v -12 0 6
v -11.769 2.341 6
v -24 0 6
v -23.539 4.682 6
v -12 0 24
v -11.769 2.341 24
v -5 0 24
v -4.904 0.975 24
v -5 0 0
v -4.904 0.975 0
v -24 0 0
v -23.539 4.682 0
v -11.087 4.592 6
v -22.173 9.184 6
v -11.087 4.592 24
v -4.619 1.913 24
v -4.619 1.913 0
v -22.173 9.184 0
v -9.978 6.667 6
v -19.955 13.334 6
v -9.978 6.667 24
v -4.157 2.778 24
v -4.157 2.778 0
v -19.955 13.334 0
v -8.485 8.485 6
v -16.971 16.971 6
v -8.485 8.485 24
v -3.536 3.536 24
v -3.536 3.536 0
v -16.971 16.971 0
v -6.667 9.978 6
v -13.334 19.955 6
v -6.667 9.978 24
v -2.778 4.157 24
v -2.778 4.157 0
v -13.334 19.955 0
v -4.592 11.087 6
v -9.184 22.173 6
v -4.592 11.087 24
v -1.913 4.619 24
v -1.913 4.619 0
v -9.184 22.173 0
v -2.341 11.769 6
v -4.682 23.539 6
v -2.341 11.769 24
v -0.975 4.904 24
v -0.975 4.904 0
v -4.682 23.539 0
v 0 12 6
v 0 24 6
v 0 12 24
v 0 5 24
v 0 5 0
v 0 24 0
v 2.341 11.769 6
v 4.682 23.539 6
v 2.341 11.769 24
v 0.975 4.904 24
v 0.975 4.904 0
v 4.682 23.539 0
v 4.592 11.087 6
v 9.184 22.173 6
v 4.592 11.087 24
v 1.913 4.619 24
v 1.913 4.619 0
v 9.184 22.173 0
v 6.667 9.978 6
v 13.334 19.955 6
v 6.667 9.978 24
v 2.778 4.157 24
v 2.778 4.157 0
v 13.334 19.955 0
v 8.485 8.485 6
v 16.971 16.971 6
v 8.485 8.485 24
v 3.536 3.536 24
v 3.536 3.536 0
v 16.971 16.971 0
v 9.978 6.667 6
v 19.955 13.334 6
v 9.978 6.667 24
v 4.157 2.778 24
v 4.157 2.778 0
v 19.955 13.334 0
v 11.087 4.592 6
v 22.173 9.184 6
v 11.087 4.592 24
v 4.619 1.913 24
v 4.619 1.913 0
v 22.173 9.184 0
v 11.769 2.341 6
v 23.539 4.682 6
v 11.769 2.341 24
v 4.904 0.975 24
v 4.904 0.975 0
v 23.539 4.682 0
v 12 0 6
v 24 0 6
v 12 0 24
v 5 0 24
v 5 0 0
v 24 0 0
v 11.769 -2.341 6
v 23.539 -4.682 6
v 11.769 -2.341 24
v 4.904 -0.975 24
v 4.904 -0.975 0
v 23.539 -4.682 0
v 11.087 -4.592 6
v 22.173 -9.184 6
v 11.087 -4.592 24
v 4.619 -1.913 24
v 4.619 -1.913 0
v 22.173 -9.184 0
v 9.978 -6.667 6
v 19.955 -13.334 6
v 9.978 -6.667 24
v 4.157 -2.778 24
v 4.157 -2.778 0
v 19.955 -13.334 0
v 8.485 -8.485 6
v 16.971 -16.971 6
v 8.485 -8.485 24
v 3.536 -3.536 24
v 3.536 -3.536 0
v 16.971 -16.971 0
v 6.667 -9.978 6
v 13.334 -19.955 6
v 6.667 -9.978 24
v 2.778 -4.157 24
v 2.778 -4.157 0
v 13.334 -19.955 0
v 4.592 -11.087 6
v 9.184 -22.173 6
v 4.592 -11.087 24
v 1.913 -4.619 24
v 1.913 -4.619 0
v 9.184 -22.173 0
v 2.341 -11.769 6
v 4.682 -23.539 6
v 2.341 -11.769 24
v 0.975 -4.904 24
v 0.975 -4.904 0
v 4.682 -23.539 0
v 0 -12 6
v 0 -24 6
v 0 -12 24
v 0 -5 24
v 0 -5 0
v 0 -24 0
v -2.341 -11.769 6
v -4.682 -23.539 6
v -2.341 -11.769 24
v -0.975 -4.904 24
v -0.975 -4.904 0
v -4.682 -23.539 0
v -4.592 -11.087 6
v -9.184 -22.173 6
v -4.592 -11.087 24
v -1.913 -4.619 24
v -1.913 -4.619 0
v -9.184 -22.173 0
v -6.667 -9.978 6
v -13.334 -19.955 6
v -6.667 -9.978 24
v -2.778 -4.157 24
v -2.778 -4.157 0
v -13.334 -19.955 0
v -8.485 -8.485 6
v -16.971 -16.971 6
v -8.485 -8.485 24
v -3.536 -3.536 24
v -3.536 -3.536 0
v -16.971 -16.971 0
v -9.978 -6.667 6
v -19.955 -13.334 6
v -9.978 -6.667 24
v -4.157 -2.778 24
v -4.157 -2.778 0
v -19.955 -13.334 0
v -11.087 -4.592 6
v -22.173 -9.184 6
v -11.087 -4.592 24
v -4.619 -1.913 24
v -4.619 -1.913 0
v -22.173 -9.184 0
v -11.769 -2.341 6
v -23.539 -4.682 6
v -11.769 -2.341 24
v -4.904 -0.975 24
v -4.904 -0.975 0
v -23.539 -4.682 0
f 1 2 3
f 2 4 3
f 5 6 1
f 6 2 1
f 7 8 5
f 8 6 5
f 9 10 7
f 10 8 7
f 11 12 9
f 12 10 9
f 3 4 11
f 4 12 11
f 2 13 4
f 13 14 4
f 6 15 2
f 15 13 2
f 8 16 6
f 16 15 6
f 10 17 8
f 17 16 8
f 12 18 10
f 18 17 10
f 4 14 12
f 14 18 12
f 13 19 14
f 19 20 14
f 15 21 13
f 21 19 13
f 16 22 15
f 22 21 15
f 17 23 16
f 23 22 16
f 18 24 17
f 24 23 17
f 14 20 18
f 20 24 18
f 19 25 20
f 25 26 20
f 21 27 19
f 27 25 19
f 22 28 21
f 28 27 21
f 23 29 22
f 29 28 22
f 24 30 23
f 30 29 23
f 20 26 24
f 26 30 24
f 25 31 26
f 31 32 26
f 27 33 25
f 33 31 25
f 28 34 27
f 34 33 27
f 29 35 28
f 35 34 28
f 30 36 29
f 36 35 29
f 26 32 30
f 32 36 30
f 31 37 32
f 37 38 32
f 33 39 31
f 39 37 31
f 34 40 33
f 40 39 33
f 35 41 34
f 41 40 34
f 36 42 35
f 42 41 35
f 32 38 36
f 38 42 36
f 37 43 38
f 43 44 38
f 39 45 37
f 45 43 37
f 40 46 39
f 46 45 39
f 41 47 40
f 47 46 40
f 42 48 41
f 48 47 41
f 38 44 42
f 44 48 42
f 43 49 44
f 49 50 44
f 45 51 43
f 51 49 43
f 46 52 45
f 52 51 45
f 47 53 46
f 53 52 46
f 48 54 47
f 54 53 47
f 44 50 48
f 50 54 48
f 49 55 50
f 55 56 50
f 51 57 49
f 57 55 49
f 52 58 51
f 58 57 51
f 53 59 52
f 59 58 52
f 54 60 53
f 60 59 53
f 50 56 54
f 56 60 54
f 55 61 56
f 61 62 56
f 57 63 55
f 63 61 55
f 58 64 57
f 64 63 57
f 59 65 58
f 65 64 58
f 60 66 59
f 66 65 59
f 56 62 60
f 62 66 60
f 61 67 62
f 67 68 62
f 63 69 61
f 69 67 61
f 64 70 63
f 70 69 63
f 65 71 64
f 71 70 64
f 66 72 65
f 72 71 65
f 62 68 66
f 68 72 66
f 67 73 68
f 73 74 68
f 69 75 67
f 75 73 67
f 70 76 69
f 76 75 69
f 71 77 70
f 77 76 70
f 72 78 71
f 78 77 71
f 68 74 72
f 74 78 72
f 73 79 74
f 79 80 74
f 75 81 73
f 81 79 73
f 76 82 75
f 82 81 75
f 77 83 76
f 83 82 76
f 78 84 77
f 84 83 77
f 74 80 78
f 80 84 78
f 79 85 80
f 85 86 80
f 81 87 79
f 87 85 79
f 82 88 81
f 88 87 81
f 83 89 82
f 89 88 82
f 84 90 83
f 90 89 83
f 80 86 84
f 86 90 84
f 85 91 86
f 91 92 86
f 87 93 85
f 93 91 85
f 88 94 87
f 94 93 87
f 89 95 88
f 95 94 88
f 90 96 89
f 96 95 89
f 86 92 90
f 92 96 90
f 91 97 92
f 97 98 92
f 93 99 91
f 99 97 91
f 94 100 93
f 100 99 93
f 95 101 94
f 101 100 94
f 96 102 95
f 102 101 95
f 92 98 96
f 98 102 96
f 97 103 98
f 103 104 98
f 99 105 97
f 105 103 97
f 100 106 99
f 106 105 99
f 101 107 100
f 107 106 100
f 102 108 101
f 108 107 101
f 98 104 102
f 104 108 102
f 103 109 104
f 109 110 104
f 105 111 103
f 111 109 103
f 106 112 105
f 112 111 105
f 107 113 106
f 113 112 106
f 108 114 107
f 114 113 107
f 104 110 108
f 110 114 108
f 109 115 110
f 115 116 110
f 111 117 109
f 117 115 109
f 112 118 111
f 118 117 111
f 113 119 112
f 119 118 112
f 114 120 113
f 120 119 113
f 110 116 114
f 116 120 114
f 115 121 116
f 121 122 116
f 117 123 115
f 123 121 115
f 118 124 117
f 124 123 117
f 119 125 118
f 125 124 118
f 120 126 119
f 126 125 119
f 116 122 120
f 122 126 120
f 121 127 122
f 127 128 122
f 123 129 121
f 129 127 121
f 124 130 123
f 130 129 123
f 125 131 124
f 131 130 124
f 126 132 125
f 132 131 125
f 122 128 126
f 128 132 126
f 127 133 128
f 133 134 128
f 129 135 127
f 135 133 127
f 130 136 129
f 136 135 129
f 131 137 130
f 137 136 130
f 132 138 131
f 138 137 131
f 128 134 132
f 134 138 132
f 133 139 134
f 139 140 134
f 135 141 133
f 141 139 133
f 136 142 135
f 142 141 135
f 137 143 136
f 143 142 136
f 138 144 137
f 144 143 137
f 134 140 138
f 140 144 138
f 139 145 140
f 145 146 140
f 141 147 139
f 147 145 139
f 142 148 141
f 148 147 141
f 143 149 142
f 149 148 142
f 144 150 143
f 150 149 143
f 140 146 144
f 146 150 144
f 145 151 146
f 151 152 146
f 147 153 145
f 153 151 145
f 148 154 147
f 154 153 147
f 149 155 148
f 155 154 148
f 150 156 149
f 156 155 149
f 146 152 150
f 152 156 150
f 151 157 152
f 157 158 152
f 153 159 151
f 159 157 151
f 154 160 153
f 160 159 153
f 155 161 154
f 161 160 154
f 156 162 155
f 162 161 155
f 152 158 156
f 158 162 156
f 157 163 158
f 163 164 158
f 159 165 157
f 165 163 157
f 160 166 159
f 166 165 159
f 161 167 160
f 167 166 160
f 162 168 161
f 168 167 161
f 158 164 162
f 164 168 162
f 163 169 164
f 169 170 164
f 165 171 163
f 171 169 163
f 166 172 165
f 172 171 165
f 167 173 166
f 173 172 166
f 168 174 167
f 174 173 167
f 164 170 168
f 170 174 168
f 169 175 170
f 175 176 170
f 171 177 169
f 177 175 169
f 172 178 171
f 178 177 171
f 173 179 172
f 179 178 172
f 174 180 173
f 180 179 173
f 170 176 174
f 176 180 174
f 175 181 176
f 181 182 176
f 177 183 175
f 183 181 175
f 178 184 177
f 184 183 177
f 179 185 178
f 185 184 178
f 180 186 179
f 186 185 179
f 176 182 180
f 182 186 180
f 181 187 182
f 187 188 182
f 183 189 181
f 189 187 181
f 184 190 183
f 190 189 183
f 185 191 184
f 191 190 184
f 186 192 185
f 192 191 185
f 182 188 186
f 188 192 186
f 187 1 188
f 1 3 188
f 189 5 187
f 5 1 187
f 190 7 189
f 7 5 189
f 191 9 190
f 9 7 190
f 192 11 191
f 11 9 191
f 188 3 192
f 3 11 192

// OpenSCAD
$fn = 32;

// ----------------------------------------------------------------------
// Revolved part: flanged bushing R24
// ----------------------------------------------------------------------

// --- parameters (mm) ---
bore_r = 5;               // bore radius
flange_r = 24;            // flange radius
flange_h = 6;             // flange thickness
sleeve_r = 12;            // sleeve radius
total_h = 24;             // overall height
revolve_angle = 360;      // revolve sweep, degrees

bore_d = 2 * bore_r;
flange_d = 2 * flange_r;
sleeve_d = 2 * sleeve_r;

profile = [[5, 0], [24, 0], [24, 6], [12, 6], [12, 24], [5, 24]];  // primary outline, 6 points, counter clockwise

// --- the one profile operation ---
rotate_extrude(angle = revolve_angle) polygon(points = profile);
